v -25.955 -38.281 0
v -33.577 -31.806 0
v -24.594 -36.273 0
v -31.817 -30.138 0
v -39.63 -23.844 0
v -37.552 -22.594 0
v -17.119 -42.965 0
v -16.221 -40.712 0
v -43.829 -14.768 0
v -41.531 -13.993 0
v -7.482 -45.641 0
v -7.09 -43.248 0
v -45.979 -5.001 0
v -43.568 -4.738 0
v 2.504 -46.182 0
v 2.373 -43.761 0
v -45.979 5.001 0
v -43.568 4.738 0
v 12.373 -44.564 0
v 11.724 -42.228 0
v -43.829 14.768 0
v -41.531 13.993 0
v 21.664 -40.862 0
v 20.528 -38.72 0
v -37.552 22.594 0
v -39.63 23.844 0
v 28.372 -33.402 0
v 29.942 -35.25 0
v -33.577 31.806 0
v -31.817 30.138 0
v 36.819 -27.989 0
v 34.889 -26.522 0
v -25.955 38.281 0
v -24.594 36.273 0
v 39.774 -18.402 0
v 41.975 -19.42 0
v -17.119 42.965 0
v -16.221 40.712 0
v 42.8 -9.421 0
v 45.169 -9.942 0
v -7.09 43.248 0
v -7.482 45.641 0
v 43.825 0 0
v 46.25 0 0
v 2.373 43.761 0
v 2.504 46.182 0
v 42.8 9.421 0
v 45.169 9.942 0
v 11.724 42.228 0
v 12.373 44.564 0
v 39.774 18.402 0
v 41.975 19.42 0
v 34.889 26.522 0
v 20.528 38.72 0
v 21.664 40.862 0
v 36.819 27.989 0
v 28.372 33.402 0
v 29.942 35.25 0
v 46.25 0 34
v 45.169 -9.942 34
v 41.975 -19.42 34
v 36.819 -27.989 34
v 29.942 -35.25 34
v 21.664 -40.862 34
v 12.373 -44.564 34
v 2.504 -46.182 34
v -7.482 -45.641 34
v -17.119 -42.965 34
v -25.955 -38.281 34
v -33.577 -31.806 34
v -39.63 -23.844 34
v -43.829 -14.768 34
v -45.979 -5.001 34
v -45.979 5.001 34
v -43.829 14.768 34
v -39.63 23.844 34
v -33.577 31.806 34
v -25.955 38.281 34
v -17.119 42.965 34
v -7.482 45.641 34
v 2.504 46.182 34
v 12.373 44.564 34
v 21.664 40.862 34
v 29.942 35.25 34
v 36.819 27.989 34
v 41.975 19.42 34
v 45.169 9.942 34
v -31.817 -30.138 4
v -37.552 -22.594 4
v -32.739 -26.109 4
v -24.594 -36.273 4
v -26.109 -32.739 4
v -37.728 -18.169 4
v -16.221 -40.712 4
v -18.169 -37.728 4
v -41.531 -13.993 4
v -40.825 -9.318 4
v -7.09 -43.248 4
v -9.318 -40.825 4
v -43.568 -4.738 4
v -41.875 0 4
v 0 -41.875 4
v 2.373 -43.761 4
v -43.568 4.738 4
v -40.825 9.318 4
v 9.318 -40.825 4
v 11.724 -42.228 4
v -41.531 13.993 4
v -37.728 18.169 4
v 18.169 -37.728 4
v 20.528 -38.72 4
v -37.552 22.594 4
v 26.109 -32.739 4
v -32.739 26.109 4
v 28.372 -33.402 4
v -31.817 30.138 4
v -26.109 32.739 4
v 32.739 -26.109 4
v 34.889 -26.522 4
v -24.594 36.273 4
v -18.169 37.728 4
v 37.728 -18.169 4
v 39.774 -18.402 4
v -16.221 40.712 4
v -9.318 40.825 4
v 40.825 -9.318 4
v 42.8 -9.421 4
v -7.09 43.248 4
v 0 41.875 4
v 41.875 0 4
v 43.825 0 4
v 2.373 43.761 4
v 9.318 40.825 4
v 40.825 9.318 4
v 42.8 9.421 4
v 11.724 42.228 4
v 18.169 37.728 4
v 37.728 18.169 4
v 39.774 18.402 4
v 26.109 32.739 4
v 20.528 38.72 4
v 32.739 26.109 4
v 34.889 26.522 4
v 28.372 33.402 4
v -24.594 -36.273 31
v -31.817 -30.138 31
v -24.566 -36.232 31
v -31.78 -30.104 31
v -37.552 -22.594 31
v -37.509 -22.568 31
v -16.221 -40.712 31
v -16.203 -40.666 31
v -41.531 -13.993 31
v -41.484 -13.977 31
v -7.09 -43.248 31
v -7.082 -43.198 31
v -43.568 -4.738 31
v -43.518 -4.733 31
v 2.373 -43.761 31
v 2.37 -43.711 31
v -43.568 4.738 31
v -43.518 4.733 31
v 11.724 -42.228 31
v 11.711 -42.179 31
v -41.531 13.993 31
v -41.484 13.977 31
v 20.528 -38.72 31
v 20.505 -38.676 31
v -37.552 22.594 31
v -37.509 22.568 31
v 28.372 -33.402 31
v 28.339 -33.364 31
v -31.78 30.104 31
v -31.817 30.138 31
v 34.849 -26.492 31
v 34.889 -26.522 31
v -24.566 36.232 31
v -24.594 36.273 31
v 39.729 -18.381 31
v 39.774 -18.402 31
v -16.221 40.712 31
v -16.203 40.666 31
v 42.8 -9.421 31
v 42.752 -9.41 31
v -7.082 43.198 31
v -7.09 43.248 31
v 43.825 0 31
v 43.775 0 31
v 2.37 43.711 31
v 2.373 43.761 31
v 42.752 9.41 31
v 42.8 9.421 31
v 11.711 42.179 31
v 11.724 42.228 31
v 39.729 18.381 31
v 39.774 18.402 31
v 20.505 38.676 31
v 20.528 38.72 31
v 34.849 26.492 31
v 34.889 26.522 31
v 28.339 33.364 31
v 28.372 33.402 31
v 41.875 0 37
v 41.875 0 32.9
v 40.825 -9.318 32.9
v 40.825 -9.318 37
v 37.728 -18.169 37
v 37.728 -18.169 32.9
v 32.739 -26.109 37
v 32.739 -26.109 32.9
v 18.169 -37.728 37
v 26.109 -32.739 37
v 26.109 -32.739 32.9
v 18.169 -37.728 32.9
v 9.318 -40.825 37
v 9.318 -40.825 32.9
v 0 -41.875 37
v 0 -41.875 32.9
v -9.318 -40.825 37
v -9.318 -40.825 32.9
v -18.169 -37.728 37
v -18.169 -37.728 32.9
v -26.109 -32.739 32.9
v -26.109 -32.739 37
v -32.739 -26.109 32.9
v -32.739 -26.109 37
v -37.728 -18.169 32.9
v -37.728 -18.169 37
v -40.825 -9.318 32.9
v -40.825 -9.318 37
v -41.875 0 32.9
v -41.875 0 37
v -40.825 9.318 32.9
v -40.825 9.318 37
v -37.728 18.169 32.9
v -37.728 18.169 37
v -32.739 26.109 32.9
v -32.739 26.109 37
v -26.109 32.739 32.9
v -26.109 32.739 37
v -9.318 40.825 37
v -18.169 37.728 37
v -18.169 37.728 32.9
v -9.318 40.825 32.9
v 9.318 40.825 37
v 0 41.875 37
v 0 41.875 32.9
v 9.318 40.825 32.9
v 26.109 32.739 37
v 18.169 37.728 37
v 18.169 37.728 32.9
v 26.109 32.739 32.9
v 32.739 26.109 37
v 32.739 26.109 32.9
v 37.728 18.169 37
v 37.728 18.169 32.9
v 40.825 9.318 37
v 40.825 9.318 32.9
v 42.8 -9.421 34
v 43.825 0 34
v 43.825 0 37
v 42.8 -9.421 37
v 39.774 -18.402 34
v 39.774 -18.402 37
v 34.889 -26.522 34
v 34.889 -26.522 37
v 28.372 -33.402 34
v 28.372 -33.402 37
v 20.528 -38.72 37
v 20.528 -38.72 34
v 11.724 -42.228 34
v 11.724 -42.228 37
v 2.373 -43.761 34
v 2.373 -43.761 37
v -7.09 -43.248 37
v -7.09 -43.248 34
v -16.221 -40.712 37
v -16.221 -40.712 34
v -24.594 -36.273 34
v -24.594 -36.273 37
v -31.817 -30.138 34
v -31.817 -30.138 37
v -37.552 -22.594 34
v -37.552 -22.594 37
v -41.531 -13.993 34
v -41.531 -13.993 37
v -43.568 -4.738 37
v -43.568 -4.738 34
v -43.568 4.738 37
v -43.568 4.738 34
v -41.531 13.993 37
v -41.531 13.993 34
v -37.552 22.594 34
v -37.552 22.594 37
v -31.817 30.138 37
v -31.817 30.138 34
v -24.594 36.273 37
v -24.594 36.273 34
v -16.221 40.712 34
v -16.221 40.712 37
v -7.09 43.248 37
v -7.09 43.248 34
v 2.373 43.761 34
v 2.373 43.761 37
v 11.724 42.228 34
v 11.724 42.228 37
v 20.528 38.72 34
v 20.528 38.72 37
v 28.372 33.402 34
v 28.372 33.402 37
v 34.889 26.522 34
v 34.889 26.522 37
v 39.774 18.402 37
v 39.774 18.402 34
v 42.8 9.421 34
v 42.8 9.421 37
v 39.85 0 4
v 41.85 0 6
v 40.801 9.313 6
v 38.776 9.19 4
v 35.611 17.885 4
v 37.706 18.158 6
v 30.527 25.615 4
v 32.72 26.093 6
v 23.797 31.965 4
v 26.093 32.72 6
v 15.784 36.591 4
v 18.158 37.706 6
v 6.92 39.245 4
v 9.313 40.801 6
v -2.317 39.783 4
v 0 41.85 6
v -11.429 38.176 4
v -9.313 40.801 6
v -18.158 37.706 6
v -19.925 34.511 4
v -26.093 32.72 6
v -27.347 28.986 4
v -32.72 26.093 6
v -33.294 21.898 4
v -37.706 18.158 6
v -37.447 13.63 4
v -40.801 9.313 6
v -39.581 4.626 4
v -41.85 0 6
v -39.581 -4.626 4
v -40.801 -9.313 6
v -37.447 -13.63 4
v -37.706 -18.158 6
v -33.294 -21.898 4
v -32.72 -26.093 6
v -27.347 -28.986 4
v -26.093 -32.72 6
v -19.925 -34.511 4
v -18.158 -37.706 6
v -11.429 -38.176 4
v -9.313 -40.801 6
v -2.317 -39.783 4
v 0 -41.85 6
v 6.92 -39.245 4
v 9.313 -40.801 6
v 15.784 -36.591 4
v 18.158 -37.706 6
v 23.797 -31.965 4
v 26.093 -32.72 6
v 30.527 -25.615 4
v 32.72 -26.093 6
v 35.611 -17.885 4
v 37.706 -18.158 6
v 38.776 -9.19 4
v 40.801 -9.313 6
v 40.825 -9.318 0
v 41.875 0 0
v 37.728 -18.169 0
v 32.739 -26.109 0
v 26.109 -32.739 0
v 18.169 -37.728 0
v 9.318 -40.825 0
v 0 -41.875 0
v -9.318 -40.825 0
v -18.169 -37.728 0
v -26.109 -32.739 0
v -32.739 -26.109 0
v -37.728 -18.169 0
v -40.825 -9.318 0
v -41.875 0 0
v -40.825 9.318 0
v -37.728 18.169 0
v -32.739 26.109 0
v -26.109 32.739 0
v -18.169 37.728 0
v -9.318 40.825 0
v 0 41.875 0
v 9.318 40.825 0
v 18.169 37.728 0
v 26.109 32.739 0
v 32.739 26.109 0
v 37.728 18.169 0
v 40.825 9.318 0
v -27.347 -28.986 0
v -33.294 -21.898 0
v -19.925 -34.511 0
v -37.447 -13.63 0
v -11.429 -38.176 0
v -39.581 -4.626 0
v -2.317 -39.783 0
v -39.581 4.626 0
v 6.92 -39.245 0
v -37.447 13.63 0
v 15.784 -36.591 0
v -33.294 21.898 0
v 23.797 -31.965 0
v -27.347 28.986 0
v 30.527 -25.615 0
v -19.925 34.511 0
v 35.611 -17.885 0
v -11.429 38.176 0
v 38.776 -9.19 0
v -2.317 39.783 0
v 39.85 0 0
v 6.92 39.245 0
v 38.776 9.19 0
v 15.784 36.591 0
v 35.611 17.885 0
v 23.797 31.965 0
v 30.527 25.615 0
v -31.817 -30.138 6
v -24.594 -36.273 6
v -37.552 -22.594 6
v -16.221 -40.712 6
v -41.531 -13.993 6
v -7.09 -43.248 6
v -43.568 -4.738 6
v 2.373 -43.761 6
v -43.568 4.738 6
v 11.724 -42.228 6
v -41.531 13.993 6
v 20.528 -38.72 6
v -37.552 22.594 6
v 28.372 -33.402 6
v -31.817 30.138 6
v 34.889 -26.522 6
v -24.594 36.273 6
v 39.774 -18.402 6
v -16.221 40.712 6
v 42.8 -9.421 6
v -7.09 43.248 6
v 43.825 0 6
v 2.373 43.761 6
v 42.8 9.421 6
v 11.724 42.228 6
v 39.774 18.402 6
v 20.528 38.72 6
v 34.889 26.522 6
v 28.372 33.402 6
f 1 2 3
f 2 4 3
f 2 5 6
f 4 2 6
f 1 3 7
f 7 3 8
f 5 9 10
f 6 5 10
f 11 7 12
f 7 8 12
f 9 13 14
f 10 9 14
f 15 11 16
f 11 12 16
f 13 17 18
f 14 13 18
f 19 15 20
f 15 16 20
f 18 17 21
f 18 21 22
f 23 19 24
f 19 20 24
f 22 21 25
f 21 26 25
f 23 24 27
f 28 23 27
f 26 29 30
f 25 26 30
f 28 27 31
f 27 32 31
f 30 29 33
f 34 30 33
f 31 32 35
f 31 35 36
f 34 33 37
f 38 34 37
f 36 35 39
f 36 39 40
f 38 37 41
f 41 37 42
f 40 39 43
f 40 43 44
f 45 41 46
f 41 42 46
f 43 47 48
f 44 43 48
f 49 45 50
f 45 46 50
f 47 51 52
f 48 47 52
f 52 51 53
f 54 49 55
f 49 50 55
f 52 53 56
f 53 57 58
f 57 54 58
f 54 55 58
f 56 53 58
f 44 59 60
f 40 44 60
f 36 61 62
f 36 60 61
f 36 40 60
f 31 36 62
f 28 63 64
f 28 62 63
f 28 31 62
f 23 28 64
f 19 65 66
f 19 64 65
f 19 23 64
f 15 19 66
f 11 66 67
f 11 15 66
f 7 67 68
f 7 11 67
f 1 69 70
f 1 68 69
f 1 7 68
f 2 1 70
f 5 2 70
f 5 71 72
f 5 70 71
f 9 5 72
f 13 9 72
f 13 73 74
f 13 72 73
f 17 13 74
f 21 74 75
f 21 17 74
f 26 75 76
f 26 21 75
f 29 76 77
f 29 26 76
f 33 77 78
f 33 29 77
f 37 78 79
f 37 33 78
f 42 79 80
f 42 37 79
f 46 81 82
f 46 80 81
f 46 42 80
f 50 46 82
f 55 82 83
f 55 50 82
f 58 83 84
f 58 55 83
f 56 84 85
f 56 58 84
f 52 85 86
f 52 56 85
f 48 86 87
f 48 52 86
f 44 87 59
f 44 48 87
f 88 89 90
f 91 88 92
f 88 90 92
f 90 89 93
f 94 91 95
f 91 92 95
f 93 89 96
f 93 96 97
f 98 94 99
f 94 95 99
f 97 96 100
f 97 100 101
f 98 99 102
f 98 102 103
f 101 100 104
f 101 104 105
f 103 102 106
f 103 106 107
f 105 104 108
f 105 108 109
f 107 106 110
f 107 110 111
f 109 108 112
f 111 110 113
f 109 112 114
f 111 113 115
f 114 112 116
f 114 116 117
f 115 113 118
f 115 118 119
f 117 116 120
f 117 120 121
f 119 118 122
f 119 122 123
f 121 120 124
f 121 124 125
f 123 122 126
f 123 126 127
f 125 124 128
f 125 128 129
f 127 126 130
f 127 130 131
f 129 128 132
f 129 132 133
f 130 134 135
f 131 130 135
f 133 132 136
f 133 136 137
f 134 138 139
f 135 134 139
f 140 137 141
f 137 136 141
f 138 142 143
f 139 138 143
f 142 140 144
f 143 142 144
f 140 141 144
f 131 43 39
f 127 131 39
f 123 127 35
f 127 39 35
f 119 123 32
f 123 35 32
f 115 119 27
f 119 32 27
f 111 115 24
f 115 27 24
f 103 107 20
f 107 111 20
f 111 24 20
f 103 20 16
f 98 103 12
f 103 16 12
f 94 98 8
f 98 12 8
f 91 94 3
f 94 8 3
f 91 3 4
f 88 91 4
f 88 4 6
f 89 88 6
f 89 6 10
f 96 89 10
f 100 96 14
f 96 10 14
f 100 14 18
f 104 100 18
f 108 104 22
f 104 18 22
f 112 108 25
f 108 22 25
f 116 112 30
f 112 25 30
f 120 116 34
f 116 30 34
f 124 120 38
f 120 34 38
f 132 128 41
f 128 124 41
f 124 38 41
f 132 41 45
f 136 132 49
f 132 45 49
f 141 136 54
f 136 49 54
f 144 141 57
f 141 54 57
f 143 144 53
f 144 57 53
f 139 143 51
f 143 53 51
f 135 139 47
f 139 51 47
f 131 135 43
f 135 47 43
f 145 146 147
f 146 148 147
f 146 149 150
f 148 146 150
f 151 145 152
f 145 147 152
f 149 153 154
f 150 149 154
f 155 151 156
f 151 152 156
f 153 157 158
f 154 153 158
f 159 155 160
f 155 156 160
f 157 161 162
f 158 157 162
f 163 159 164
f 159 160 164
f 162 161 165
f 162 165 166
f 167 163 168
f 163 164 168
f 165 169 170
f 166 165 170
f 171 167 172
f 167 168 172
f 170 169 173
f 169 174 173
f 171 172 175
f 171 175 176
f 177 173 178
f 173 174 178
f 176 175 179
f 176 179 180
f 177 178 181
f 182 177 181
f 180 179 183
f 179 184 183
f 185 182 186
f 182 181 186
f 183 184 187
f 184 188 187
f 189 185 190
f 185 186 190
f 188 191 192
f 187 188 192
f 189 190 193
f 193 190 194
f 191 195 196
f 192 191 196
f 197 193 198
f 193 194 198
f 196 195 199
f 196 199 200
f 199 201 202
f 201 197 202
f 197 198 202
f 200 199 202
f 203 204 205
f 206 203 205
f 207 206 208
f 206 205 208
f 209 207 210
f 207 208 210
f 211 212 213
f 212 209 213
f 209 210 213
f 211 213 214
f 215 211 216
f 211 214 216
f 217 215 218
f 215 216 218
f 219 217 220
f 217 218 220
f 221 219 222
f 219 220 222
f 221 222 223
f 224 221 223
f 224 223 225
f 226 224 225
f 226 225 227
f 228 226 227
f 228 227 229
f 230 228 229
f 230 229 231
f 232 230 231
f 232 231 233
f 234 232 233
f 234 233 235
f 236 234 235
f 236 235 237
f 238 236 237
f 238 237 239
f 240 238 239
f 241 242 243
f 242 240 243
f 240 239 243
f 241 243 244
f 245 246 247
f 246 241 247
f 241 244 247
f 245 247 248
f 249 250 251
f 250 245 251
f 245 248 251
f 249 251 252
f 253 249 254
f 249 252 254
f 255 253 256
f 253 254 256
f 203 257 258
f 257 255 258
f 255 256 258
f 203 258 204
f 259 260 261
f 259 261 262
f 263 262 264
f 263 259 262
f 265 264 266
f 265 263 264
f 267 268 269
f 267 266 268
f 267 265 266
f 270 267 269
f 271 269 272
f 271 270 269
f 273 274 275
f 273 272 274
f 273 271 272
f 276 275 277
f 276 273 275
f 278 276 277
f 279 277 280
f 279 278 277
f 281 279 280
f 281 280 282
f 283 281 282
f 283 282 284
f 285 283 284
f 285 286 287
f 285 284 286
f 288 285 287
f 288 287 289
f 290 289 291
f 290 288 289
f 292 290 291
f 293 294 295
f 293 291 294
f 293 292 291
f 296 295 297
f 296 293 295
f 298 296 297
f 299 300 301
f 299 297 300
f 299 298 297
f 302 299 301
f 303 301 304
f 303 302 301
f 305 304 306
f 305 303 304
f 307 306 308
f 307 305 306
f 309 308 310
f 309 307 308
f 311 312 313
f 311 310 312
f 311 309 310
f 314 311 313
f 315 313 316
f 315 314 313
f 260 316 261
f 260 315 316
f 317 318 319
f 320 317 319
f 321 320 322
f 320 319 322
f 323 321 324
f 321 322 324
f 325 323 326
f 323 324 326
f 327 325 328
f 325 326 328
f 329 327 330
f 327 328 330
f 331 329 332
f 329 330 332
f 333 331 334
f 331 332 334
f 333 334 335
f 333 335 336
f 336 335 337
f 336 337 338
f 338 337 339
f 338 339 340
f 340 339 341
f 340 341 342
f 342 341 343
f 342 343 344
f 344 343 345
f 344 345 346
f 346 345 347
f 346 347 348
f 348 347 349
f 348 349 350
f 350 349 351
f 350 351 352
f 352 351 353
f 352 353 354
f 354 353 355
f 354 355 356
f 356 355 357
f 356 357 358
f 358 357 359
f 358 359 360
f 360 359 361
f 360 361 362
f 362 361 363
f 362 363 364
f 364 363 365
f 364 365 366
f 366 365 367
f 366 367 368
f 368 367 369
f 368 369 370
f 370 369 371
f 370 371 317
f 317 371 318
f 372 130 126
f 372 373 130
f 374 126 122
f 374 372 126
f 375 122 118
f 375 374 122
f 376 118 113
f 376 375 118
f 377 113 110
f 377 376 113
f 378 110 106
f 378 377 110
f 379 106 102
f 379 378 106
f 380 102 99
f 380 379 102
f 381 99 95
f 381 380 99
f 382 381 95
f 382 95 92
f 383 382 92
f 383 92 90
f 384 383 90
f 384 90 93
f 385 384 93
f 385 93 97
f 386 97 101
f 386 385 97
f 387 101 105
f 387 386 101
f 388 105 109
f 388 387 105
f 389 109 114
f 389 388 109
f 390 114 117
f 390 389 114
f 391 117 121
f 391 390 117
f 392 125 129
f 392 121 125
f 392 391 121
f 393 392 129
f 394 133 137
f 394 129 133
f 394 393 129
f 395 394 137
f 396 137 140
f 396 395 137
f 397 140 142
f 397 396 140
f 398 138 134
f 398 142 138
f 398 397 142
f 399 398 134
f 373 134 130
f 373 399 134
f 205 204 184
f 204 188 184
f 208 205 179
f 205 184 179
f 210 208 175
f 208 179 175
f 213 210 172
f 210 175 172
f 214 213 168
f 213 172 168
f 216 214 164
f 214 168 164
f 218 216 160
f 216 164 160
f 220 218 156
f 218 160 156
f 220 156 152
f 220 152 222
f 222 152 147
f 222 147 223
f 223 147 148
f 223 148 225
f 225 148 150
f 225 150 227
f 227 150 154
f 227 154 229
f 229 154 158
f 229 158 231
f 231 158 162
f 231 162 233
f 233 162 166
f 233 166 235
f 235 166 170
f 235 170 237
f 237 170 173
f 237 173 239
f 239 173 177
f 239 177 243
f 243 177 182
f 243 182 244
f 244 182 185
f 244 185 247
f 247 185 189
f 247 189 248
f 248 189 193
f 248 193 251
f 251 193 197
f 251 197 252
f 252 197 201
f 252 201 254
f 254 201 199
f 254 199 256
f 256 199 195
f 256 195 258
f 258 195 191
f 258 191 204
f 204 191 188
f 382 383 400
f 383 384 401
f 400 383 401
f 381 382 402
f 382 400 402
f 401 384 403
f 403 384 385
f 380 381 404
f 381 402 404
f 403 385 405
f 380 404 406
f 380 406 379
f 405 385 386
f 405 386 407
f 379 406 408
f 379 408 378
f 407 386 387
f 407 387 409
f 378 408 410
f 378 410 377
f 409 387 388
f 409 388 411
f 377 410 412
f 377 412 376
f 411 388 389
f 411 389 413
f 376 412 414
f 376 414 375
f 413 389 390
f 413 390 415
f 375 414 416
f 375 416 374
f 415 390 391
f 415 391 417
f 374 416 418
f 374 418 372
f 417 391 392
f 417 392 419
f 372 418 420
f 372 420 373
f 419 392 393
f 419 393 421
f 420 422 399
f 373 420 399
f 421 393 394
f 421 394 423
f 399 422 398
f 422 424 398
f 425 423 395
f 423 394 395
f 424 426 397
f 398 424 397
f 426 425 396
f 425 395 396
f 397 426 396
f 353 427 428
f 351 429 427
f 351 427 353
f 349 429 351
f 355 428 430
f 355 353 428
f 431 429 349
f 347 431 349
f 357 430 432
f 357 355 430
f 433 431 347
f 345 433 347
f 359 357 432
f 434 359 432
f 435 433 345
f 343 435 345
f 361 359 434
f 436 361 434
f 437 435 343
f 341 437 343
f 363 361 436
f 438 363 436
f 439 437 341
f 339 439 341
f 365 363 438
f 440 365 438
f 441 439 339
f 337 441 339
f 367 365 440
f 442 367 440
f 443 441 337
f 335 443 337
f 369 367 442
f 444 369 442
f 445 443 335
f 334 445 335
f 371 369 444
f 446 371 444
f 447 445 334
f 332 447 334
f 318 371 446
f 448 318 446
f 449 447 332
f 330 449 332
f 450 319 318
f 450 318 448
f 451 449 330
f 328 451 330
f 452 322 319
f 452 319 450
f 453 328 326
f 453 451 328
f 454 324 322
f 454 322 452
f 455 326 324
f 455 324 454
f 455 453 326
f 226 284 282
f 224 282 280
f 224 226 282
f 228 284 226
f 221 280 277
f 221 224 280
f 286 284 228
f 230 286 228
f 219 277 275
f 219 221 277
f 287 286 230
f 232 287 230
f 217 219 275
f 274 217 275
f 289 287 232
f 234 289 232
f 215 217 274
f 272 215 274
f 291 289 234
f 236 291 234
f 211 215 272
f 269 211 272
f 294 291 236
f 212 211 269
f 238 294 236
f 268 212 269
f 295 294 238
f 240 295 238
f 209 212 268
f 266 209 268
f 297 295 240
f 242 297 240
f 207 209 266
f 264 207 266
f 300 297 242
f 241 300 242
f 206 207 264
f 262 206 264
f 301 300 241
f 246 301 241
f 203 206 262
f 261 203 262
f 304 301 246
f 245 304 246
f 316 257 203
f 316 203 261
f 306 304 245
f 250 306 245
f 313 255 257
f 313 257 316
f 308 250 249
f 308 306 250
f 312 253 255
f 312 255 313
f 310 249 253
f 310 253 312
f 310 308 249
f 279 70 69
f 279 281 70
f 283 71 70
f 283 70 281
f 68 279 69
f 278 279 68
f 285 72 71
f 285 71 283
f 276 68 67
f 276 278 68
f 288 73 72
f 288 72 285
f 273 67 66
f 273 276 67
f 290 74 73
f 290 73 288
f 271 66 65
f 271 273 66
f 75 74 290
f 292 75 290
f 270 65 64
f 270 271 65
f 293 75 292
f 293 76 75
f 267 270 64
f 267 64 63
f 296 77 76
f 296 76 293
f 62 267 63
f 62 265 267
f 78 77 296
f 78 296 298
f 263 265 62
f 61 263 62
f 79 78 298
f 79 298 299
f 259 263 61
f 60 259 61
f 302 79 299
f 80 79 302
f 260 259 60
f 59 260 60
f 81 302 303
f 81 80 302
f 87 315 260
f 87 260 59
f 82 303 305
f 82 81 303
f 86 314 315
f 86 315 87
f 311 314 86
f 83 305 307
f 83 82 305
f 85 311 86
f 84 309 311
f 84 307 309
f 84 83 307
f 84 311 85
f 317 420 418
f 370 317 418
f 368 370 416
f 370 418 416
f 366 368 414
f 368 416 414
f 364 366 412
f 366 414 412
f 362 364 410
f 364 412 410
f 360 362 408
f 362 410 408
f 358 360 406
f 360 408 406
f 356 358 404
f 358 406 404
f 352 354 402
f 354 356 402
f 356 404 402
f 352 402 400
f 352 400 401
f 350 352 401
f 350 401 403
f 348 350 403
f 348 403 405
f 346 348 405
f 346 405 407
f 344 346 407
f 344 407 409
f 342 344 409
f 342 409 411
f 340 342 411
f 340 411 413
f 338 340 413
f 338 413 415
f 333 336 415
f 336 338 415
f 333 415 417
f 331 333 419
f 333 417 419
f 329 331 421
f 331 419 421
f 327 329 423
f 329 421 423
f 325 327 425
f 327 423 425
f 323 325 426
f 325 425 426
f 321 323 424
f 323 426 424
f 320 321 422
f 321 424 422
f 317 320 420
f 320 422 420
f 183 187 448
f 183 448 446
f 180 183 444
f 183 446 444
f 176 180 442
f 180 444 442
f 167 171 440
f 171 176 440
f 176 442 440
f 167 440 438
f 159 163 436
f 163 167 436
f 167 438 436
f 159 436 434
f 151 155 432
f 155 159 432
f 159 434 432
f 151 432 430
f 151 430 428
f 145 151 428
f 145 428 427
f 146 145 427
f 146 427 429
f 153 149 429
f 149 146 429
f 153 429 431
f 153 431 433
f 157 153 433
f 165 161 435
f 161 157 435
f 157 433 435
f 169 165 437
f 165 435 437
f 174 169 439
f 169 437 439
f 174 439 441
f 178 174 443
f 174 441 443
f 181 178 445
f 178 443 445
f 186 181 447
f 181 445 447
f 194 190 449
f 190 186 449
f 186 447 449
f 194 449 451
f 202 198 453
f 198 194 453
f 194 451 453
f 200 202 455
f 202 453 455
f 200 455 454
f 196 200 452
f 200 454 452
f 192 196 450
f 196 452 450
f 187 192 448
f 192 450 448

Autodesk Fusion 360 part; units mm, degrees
sketch "chamber" plane through (0, 0, 0) normal (0, 0, 1) x (1, 0, 0)
  circle A0 centre (0, 0) radius 43.825
  circle A1 centre (0, 0) radius 41.875
  circle A2 centre (0, 0) radius 46.25
  circle A3 centre (0, 0) radius 39.85
  dimension "d4" = 87.65
  dimension "d5" = 83.75
  dimension "d6" = 92.5
  dimension "d14" = 79.7
extrude "Extrude1" add sketch "chamber" along normal blind 34 contours A2
extrude "Extrude3" add sketch "chamber" along normal blind 6 from surface at 31 contours A0
extrude "Extrude4" add sketch "chamber" along normal blind 6 contours A0 | A1
extrude "Extrude5" cut sketch "chamber" along normal blind 4 contours A0
chamfer "Chamfer1" distance 2 angle 45 1 edges at (-37.1532, 14.4104, 6)
chamfer "Chamfer2" distance 1.9 angle 45 1 edges at (-39.0412, 15.1426, 31)
equation "ChamberSize = 92.5 mm"
equation "ChamberOffset = 4.8 mm"
equation "ChamberInner = 4 mm"
equation "d4 = ChamberSize - ChamberOffset - 0.05 mm"
equation "d5 = ChamberSize - ChamberOffset - ChamberInner + 0.05 mm"
equation "d6 = ChamberSize"
equation "ChamberHeight = 34 mm"
equation "d8 = ChamberHeight"
equation "ChamberLip = 4 mm"
equation "d14 = ChamberSize - ChamberOffset - ChamberInner - 4 mm"
equation "d15 = ChamberLip + 2 mm"
equation "d17 = ChamberHeight - 3 mm"
